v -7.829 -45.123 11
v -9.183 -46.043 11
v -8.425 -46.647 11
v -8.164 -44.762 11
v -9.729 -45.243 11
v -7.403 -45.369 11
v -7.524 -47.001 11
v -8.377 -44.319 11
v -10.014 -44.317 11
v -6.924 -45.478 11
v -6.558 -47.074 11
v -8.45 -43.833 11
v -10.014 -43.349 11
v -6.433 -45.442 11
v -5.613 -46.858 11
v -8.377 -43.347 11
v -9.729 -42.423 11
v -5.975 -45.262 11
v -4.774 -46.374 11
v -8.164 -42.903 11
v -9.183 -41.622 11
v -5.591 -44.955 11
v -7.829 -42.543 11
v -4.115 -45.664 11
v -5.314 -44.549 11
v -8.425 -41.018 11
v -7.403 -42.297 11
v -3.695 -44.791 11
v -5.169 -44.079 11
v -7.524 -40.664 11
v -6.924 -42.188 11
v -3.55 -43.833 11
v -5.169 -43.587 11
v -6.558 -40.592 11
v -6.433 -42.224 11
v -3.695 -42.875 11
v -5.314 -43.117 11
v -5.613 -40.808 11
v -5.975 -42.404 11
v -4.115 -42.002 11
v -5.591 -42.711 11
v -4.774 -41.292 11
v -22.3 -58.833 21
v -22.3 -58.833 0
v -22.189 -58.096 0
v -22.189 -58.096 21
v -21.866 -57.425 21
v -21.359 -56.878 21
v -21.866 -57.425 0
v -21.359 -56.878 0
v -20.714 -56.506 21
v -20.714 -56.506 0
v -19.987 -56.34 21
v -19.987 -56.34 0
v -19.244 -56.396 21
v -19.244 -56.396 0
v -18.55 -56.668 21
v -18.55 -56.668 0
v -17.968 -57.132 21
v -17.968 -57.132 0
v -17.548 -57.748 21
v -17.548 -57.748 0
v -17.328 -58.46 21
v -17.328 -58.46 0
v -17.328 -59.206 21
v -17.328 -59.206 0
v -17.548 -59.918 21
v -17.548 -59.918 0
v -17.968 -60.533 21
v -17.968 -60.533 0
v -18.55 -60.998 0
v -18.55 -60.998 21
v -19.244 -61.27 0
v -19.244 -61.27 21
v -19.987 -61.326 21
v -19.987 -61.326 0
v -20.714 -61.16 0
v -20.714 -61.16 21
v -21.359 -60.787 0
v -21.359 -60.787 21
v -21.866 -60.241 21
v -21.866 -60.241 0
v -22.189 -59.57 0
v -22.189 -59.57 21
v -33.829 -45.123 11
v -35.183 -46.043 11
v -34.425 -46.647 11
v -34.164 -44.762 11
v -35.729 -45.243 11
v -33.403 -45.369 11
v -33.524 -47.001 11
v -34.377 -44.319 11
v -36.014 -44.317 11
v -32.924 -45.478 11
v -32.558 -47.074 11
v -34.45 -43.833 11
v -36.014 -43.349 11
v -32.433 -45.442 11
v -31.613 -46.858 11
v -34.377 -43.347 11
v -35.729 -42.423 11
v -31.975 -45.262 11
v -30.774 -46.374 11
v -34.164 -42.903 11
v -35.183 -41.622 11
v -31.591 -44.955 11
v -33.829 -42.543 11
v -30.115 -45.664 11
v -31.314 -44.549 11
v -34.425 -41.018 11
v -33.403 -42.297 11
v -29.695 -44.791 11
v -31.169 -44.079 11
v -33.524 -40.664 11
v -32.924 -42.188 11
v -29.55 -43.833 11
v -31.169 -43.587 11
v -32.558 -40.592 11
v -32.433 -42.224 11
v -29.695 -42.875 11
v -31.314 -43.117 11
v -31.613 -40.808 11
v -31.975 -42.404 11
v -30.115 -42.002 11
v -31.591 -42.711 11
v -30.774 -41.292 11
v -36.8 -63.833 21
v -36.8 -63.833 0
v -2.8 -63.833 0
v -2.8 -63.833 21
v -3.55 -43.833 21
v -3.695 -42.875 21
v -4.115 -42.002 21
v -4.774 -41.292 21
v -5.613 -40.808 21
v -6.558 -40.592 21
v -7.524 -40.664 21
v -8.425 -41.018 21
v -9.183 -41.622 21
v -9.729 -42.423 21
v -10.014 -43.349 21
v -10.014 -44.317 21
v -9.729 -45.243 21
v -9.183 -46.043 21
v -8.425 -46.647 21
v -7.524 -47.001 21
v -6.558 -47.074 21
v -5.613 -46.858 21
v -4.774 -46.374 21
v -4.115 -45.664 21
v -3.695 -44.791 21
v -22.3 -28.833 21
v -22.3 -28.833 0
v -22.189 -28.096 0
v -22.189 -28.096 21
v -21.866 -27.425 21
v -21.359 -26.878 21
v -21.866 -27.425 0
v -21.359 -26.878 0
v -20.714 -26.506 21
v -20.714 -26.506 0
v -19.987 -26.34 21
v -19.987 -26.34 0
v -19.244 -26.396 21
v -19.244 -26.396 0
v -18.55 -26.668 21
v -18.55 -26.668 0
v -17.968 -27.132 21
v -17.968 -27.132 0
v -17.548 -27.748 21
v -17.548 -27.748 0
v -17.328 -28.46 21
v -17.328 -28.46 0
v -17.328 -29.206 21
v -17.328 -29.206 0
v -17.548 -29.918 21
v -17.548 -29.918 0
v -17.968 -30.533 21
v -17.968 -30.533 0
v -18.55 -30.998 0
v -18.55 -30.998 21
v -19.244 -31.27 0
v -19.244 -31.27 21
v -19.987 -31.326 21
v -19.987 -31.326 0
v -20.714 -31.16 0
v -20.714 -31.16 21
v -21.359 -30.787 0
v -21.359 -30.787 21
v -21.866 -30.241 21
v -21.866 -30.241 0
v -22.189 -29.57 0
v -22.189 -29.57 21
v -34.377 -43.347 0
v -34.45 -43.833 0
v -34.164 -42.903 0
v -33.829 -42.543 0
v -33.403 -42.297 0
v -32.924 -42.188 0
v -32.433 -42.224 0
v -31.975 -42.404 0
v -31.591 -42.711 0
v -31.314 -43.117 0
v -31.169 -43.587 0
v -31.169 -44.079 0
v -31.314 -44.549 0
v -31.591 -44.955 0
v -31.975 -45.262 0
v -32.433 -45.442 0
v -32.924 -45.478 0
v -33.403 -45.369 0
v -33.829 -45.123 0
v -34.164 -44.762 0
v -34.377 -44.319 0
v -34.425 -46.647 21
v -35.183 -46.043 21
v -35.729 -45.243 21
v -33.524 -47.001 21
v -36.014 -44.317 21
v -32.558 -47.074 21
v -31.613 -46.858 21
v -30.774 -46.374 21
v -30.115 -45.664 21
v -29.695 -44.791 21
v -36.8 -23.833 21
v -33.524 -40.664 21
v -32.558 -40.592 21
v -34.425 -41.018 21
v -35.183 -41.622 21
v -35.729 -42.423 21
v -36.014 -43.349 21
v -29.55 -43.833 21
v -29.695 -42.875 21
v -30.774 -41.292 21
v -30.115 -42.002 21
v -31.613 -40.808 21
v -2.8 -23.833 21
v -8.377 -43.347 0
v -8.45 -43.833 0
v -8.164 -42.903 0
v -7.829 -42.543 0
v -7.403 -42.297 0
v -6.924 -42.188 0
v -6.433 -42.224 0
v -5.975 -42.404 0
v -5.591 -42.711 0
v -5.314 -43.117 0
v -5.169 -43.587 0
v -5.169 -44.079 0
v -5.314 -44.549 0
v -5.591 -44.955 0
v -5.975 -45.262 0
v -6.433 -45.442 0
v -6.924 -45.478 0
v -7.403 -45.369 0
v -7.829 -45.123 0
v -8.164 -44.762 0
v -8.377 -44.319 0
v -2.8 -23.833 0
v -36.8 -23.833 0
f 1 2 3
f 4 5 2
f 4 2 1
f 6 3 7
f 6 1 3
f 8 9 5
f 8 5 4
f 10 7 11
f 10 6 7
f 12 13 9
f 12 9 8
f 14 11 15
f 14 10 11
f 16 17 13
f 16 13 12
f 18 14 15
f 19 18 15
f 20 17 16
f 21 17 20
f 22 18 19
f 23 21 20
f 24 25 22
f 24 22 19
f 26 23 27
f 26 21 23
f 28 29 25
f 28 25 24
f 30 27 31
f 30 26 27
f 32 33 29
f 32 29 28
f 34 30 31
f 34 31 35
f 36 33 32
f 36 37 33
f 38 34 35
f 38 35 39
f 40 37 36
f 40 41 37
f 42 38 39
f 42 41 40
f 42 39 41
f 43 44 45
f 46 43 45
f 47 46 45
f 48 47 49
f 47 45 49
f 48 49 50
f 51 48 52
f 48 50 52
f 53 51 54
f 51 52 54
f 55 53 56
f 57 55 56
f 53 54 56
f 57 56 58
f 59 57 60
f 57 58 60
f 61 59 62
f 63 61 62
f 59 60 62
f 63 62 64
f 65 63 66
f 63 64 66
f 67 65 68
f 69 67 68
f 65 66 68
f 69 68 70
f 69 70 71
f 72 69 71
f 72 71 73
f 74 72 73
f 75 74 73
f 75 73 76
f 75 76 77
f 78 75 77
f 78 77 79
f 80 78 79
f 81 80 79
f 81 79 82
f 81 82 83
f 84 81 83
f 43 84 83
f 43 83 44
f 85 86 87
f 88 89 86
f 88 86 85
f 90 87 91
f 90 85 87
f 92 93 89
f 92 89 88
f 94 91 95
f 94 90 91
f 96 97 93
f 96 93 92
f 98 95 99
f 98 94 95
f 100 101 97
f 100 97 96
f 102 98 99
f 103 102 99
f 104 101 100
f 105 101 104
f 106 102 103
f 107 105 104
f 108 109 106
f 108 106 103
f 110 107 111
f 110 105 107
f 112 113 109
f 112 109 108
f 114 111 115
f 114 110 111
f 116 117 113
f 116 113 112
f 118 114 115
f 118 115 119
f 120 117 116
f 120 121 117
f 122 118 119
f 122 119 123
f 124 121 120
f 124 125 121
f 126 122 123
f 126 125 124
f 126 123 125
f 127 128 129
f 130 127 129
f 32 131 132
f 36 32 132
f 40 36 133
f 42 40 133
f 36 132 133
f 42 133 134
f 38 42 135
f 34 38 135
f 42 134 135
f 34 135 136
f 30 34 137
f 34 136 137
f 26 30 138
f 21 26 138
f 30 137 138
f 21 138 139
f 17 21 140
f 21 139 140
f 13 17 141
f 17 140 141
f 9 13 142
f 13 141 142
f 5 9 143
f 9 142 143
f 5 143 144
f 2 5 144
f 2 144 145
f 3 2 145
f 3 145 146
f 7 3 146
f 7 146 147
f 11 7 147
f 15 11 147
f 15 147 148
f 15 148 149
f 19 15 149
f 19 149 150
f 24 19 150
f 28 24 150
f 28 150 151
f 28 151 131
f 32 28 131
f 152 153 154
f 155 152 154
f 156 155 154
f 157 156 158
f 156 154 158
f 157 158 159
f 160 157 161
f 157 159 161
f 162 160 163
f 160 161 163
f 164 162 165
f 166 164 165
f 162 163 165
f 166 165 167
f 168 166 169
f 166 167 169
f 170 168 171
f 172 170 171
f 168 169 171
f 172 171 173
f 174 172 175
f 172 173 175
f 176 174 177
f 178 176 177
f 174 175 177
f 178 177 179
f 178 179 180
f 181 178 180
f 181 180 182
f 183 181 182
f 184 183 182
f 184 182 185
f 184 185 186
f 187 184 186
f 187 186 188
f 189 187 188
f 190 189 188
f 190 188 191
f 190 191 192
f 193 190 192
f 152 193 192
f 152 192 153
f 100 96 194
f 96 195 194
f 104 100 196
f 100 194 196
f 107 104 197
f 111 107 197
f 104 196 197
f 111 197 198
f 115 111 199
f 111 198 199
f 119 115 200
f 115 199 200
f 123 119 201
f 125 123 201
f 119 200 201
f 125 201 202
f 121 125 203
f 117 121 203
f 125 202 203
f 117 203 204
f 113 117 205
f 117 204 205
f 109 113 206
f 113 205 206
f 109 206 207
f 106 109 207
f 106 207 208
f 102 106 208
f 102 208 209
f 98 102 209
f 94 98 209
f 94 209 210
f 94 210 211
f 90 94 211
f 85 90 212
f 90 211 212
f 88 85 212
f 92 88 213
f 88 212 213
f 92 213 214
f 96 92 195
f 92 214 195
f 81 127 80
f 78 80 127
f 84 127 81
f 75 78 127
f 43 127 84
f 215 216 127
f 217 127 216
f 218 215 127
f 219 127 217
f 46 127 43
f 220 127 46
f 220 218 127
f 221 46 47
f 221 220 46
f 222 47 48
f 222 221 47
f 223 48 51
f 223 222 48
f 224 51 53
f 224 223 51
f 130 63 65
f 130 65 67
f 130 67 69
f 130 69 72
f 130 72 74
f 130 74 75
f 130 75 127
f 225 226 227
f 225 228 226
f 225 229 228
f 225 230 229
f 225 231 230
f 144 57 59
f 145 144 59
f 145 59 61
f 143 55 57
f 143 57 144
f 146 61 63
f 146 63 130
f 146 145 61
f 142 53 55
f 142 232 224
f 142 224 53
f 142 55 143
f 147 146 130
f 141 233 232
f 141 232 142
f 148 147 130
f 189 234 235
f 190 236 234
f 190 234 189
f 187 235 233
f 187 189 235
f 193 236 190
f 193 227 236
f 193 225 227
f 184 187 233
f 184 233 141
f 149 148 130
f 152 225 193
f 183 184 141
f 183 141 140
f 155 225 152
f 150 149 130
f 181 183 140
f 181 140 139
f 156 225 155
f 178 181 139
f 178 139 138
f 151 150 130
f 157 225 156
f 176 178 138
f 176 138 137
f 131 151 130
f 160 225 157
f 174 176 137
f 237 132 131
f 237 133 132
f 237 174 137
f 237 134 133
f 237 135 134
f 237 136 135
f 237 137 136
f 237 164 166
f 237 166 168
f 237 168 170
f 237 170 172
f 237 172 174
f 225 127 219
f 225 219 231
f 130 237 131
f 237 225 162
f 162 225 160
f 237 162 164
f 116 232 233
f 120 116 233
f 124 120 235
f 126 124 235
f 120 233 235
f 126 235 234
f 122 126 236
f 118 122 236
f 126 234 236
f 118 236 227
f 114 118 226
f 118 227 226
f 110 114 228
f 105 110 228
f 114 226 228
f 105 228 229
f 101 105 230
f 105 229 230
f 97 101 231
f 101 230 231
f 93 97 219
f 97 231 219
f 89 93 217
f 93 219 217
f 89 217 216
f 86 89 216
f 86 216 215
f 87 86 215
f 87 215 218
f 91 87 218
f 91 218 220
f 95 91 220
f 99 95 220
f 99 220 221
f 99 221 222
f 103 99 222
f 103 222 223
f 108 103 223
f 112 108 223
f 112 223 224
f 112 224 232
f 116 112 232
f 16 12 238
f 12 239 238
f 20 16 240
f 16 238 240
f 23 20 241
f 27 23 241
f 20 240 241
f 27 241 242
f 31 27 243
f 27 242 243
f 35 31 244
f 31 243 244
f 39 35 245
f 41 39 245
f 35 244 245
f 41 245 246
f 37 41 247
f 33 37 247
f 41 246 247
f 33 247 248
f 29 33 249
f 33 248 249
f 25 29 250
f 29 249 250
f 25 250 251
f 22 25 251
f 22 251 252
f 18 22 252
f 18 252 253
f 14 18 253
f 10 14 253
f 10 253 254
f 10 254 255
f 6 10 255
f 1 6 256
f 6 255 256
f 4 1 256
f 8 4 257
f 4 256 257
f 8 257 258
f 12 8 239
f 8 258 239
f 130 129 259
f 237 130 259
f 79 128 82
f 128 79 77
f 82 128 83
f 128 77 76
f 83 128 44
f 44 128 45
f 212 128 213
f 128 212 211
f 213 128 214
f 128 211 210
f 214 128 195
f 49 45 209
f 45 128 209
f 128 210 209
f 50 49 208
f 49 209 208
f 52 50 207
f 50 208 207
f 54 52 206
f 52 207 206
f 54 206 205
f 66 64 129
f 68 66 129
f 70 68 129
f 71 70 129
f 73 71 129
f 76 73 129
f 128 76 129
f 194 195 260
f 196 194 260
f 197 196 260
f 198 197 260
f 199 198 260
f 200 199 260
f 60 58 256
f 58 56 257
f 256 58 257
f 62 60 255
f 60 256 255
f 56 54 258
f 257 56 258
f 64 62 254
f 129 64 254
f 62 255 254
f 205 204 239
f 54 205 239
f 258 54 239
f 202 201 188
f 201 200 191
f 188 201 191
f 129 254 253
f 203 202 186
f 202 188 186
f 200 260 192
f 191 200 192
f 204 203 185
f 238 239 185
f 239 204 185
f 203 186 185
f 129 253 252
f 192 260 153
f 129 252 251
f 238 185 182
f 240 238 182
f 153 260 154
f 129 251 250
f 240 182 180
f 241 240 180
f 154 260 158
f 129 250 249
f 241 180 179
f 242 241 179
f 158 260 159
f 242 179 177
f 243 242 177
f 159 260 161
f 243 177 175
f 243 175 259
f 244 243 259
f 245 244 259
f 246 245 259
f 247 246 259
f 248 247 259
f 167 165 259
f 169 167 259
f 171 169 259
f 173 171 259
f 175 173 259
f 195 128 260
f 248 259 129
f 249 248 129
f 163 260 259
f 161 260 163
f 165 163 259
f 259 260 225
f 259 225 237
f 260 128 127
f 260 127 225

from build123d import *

# Parameters (mm, degrees)
F0_W           = 34
F0_H           = 40
F1_DEPTH       = 21
F3_D           = 3.3
F3_CBORE_D     = 6.5
F3_CBORE_DEPTH = 10
F4_D           = 5


with BuildPart() as f1:
    # F0 (on Top) → F1 (new body)
    with BuildSketch(Plane.XY):
        with Locations((-19.8004702032, -43.8329163194)):
            Rectangle(F0_W, F0_H)
    extrude(amount=F1_DEPTH)

    # F3 (through all)
    with Locations(Plane.XY.offset(21)):
        with Locations((-32.8004702032, -43.8329163194), (-6.8004702032, -43.8329163194)):
            CounterBoreHole(F3_D / 2, F3_CBORE_D / 2, F3_CBORE_DEPTH)

    # F4 (through all)
    with Locations(Plane.XY.offset(21)):
        with Locations((-19.8004702032, -28.8329163194), (-19.8004702032, -58.8329163194)):
            Hole(F4_D / 2)


solid = f1.part
